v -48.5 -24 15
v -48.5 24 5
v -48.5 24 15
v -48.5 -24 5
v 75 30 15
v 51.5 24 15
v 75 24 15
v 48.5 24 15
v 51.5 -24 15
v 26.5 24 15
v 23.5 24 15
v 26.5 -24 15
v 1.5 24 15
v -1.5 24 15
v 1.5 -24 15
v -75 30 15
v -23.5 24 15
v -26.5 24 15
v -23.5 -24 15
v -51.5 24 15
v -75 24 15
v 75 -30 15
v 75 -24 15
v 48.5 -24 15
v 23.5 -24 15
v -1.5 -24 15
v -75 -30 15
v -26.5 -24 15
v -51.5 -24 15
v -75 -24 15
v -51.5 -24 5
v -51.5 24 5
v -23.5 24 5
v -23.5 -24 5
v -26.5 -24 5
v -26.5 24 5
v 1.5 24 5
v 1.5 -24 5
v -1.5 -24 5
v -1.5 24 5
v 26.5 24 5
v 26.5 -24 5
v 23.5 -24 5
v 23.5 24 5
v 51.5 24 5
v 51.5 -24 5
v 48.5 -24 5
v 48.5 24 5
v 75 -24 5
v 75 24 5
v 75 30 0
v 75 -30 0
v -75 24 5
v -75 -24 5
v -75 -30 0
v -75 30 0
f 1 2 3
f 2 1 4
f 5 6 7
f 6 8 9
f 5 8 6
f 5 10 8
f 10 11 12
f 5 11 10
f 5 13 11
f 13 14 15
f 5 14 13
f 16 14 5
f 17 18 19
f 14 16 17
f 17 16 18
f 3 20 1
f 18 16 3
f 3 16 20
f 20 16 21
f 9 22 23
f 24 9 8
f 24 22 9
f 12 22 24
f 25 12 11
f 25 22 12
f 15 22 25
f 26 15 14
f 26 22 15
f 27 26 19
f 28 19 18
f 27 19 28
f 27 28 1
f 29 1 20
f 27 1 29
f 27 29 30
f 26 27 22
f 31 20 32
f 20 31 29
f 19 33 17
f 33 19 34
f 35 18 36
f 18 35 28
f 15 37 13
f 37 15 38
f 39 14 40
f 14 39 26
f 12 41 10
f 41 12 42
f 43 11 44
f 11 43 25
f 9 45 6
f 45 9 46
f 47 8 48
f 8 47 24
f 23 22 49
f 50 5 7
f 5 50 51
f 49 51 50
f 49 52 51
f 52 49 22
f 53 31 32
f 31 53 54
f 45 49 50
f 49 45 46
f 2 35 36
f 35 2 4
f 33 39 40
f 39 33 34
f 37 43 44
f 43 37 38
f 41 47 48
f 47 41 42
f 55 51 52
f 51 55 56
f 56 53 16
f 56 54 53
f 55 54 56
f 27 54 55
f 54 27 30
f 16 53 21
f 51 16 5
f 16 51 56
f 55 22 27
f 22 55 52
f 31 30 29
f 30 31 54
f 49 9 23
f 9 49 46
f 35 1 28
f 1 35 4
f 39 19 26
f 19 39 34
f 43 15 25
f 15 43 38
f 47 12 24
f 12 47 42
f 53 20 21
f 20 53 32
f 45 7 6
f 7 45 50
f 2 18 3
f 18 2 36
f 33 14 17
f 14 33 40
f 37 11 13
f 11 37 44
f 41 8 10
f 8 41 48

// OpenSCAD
$fn = 32;

// ----------------------------------------------------------------------
// Rib frame 150 x 60 x 15
// 5 ribs at 25 mm pitch
// ----------------------------------------------------------------------

// --- parameters (mm) ---
frame = [150, 60, 5];  // base plate size (x, y, z)
rail_w = 6;            // side rail width
ribs = 5;              // number of ribs
rib_t = 3;             // rib thickness
rib_h = 10;            // rib height above the base plate
pitch = 25;            // pitch between rib centres

// --- derived feature positions (mm) ---
span = (ribs - 1) * pitch;          // = 100   distance between the outer ribs
origin_x = -span / 2;               // = -50   X of the first rib
rib_len = frame[1] - 2 * rail_w + 2;  // = 50   rib length, 1 mm into each rail
feature_centers = [
  [origin_x + 0 * pitch, 0],
  [origin_x + 1 * pitch, 0],
  [origin_x + 2 * pitch, 0],
  [origin_x + 3 * pitch, 0],
  [origin_x + 4 * pitch, 0]
];   // rib centre line, drives the rib loop

// base plate, two side rails, then the ribs read straight off feature_centers
union() {
  translate([-frame[0] / 2, -frame[1] / 2, 0]) cube(frame);
  translate([-frame[0] / 2, -frame[1] / 2, 0]) cube([frame[0], rail_w, frame[2] + rib_h]);
  translate([-frame[0] / 2, frame[1] / 2 - rail_w, 0]) cube([frame[0], rail_w, frame[2] + rib_h]);
  for (centre = feature_centers)
    translate([centre[0] - rib_t / 2, centre[1] - rib_len / 2, frame[2] - 1])
      cube([rib_t, rib_len, rib_h + 1]);
}
